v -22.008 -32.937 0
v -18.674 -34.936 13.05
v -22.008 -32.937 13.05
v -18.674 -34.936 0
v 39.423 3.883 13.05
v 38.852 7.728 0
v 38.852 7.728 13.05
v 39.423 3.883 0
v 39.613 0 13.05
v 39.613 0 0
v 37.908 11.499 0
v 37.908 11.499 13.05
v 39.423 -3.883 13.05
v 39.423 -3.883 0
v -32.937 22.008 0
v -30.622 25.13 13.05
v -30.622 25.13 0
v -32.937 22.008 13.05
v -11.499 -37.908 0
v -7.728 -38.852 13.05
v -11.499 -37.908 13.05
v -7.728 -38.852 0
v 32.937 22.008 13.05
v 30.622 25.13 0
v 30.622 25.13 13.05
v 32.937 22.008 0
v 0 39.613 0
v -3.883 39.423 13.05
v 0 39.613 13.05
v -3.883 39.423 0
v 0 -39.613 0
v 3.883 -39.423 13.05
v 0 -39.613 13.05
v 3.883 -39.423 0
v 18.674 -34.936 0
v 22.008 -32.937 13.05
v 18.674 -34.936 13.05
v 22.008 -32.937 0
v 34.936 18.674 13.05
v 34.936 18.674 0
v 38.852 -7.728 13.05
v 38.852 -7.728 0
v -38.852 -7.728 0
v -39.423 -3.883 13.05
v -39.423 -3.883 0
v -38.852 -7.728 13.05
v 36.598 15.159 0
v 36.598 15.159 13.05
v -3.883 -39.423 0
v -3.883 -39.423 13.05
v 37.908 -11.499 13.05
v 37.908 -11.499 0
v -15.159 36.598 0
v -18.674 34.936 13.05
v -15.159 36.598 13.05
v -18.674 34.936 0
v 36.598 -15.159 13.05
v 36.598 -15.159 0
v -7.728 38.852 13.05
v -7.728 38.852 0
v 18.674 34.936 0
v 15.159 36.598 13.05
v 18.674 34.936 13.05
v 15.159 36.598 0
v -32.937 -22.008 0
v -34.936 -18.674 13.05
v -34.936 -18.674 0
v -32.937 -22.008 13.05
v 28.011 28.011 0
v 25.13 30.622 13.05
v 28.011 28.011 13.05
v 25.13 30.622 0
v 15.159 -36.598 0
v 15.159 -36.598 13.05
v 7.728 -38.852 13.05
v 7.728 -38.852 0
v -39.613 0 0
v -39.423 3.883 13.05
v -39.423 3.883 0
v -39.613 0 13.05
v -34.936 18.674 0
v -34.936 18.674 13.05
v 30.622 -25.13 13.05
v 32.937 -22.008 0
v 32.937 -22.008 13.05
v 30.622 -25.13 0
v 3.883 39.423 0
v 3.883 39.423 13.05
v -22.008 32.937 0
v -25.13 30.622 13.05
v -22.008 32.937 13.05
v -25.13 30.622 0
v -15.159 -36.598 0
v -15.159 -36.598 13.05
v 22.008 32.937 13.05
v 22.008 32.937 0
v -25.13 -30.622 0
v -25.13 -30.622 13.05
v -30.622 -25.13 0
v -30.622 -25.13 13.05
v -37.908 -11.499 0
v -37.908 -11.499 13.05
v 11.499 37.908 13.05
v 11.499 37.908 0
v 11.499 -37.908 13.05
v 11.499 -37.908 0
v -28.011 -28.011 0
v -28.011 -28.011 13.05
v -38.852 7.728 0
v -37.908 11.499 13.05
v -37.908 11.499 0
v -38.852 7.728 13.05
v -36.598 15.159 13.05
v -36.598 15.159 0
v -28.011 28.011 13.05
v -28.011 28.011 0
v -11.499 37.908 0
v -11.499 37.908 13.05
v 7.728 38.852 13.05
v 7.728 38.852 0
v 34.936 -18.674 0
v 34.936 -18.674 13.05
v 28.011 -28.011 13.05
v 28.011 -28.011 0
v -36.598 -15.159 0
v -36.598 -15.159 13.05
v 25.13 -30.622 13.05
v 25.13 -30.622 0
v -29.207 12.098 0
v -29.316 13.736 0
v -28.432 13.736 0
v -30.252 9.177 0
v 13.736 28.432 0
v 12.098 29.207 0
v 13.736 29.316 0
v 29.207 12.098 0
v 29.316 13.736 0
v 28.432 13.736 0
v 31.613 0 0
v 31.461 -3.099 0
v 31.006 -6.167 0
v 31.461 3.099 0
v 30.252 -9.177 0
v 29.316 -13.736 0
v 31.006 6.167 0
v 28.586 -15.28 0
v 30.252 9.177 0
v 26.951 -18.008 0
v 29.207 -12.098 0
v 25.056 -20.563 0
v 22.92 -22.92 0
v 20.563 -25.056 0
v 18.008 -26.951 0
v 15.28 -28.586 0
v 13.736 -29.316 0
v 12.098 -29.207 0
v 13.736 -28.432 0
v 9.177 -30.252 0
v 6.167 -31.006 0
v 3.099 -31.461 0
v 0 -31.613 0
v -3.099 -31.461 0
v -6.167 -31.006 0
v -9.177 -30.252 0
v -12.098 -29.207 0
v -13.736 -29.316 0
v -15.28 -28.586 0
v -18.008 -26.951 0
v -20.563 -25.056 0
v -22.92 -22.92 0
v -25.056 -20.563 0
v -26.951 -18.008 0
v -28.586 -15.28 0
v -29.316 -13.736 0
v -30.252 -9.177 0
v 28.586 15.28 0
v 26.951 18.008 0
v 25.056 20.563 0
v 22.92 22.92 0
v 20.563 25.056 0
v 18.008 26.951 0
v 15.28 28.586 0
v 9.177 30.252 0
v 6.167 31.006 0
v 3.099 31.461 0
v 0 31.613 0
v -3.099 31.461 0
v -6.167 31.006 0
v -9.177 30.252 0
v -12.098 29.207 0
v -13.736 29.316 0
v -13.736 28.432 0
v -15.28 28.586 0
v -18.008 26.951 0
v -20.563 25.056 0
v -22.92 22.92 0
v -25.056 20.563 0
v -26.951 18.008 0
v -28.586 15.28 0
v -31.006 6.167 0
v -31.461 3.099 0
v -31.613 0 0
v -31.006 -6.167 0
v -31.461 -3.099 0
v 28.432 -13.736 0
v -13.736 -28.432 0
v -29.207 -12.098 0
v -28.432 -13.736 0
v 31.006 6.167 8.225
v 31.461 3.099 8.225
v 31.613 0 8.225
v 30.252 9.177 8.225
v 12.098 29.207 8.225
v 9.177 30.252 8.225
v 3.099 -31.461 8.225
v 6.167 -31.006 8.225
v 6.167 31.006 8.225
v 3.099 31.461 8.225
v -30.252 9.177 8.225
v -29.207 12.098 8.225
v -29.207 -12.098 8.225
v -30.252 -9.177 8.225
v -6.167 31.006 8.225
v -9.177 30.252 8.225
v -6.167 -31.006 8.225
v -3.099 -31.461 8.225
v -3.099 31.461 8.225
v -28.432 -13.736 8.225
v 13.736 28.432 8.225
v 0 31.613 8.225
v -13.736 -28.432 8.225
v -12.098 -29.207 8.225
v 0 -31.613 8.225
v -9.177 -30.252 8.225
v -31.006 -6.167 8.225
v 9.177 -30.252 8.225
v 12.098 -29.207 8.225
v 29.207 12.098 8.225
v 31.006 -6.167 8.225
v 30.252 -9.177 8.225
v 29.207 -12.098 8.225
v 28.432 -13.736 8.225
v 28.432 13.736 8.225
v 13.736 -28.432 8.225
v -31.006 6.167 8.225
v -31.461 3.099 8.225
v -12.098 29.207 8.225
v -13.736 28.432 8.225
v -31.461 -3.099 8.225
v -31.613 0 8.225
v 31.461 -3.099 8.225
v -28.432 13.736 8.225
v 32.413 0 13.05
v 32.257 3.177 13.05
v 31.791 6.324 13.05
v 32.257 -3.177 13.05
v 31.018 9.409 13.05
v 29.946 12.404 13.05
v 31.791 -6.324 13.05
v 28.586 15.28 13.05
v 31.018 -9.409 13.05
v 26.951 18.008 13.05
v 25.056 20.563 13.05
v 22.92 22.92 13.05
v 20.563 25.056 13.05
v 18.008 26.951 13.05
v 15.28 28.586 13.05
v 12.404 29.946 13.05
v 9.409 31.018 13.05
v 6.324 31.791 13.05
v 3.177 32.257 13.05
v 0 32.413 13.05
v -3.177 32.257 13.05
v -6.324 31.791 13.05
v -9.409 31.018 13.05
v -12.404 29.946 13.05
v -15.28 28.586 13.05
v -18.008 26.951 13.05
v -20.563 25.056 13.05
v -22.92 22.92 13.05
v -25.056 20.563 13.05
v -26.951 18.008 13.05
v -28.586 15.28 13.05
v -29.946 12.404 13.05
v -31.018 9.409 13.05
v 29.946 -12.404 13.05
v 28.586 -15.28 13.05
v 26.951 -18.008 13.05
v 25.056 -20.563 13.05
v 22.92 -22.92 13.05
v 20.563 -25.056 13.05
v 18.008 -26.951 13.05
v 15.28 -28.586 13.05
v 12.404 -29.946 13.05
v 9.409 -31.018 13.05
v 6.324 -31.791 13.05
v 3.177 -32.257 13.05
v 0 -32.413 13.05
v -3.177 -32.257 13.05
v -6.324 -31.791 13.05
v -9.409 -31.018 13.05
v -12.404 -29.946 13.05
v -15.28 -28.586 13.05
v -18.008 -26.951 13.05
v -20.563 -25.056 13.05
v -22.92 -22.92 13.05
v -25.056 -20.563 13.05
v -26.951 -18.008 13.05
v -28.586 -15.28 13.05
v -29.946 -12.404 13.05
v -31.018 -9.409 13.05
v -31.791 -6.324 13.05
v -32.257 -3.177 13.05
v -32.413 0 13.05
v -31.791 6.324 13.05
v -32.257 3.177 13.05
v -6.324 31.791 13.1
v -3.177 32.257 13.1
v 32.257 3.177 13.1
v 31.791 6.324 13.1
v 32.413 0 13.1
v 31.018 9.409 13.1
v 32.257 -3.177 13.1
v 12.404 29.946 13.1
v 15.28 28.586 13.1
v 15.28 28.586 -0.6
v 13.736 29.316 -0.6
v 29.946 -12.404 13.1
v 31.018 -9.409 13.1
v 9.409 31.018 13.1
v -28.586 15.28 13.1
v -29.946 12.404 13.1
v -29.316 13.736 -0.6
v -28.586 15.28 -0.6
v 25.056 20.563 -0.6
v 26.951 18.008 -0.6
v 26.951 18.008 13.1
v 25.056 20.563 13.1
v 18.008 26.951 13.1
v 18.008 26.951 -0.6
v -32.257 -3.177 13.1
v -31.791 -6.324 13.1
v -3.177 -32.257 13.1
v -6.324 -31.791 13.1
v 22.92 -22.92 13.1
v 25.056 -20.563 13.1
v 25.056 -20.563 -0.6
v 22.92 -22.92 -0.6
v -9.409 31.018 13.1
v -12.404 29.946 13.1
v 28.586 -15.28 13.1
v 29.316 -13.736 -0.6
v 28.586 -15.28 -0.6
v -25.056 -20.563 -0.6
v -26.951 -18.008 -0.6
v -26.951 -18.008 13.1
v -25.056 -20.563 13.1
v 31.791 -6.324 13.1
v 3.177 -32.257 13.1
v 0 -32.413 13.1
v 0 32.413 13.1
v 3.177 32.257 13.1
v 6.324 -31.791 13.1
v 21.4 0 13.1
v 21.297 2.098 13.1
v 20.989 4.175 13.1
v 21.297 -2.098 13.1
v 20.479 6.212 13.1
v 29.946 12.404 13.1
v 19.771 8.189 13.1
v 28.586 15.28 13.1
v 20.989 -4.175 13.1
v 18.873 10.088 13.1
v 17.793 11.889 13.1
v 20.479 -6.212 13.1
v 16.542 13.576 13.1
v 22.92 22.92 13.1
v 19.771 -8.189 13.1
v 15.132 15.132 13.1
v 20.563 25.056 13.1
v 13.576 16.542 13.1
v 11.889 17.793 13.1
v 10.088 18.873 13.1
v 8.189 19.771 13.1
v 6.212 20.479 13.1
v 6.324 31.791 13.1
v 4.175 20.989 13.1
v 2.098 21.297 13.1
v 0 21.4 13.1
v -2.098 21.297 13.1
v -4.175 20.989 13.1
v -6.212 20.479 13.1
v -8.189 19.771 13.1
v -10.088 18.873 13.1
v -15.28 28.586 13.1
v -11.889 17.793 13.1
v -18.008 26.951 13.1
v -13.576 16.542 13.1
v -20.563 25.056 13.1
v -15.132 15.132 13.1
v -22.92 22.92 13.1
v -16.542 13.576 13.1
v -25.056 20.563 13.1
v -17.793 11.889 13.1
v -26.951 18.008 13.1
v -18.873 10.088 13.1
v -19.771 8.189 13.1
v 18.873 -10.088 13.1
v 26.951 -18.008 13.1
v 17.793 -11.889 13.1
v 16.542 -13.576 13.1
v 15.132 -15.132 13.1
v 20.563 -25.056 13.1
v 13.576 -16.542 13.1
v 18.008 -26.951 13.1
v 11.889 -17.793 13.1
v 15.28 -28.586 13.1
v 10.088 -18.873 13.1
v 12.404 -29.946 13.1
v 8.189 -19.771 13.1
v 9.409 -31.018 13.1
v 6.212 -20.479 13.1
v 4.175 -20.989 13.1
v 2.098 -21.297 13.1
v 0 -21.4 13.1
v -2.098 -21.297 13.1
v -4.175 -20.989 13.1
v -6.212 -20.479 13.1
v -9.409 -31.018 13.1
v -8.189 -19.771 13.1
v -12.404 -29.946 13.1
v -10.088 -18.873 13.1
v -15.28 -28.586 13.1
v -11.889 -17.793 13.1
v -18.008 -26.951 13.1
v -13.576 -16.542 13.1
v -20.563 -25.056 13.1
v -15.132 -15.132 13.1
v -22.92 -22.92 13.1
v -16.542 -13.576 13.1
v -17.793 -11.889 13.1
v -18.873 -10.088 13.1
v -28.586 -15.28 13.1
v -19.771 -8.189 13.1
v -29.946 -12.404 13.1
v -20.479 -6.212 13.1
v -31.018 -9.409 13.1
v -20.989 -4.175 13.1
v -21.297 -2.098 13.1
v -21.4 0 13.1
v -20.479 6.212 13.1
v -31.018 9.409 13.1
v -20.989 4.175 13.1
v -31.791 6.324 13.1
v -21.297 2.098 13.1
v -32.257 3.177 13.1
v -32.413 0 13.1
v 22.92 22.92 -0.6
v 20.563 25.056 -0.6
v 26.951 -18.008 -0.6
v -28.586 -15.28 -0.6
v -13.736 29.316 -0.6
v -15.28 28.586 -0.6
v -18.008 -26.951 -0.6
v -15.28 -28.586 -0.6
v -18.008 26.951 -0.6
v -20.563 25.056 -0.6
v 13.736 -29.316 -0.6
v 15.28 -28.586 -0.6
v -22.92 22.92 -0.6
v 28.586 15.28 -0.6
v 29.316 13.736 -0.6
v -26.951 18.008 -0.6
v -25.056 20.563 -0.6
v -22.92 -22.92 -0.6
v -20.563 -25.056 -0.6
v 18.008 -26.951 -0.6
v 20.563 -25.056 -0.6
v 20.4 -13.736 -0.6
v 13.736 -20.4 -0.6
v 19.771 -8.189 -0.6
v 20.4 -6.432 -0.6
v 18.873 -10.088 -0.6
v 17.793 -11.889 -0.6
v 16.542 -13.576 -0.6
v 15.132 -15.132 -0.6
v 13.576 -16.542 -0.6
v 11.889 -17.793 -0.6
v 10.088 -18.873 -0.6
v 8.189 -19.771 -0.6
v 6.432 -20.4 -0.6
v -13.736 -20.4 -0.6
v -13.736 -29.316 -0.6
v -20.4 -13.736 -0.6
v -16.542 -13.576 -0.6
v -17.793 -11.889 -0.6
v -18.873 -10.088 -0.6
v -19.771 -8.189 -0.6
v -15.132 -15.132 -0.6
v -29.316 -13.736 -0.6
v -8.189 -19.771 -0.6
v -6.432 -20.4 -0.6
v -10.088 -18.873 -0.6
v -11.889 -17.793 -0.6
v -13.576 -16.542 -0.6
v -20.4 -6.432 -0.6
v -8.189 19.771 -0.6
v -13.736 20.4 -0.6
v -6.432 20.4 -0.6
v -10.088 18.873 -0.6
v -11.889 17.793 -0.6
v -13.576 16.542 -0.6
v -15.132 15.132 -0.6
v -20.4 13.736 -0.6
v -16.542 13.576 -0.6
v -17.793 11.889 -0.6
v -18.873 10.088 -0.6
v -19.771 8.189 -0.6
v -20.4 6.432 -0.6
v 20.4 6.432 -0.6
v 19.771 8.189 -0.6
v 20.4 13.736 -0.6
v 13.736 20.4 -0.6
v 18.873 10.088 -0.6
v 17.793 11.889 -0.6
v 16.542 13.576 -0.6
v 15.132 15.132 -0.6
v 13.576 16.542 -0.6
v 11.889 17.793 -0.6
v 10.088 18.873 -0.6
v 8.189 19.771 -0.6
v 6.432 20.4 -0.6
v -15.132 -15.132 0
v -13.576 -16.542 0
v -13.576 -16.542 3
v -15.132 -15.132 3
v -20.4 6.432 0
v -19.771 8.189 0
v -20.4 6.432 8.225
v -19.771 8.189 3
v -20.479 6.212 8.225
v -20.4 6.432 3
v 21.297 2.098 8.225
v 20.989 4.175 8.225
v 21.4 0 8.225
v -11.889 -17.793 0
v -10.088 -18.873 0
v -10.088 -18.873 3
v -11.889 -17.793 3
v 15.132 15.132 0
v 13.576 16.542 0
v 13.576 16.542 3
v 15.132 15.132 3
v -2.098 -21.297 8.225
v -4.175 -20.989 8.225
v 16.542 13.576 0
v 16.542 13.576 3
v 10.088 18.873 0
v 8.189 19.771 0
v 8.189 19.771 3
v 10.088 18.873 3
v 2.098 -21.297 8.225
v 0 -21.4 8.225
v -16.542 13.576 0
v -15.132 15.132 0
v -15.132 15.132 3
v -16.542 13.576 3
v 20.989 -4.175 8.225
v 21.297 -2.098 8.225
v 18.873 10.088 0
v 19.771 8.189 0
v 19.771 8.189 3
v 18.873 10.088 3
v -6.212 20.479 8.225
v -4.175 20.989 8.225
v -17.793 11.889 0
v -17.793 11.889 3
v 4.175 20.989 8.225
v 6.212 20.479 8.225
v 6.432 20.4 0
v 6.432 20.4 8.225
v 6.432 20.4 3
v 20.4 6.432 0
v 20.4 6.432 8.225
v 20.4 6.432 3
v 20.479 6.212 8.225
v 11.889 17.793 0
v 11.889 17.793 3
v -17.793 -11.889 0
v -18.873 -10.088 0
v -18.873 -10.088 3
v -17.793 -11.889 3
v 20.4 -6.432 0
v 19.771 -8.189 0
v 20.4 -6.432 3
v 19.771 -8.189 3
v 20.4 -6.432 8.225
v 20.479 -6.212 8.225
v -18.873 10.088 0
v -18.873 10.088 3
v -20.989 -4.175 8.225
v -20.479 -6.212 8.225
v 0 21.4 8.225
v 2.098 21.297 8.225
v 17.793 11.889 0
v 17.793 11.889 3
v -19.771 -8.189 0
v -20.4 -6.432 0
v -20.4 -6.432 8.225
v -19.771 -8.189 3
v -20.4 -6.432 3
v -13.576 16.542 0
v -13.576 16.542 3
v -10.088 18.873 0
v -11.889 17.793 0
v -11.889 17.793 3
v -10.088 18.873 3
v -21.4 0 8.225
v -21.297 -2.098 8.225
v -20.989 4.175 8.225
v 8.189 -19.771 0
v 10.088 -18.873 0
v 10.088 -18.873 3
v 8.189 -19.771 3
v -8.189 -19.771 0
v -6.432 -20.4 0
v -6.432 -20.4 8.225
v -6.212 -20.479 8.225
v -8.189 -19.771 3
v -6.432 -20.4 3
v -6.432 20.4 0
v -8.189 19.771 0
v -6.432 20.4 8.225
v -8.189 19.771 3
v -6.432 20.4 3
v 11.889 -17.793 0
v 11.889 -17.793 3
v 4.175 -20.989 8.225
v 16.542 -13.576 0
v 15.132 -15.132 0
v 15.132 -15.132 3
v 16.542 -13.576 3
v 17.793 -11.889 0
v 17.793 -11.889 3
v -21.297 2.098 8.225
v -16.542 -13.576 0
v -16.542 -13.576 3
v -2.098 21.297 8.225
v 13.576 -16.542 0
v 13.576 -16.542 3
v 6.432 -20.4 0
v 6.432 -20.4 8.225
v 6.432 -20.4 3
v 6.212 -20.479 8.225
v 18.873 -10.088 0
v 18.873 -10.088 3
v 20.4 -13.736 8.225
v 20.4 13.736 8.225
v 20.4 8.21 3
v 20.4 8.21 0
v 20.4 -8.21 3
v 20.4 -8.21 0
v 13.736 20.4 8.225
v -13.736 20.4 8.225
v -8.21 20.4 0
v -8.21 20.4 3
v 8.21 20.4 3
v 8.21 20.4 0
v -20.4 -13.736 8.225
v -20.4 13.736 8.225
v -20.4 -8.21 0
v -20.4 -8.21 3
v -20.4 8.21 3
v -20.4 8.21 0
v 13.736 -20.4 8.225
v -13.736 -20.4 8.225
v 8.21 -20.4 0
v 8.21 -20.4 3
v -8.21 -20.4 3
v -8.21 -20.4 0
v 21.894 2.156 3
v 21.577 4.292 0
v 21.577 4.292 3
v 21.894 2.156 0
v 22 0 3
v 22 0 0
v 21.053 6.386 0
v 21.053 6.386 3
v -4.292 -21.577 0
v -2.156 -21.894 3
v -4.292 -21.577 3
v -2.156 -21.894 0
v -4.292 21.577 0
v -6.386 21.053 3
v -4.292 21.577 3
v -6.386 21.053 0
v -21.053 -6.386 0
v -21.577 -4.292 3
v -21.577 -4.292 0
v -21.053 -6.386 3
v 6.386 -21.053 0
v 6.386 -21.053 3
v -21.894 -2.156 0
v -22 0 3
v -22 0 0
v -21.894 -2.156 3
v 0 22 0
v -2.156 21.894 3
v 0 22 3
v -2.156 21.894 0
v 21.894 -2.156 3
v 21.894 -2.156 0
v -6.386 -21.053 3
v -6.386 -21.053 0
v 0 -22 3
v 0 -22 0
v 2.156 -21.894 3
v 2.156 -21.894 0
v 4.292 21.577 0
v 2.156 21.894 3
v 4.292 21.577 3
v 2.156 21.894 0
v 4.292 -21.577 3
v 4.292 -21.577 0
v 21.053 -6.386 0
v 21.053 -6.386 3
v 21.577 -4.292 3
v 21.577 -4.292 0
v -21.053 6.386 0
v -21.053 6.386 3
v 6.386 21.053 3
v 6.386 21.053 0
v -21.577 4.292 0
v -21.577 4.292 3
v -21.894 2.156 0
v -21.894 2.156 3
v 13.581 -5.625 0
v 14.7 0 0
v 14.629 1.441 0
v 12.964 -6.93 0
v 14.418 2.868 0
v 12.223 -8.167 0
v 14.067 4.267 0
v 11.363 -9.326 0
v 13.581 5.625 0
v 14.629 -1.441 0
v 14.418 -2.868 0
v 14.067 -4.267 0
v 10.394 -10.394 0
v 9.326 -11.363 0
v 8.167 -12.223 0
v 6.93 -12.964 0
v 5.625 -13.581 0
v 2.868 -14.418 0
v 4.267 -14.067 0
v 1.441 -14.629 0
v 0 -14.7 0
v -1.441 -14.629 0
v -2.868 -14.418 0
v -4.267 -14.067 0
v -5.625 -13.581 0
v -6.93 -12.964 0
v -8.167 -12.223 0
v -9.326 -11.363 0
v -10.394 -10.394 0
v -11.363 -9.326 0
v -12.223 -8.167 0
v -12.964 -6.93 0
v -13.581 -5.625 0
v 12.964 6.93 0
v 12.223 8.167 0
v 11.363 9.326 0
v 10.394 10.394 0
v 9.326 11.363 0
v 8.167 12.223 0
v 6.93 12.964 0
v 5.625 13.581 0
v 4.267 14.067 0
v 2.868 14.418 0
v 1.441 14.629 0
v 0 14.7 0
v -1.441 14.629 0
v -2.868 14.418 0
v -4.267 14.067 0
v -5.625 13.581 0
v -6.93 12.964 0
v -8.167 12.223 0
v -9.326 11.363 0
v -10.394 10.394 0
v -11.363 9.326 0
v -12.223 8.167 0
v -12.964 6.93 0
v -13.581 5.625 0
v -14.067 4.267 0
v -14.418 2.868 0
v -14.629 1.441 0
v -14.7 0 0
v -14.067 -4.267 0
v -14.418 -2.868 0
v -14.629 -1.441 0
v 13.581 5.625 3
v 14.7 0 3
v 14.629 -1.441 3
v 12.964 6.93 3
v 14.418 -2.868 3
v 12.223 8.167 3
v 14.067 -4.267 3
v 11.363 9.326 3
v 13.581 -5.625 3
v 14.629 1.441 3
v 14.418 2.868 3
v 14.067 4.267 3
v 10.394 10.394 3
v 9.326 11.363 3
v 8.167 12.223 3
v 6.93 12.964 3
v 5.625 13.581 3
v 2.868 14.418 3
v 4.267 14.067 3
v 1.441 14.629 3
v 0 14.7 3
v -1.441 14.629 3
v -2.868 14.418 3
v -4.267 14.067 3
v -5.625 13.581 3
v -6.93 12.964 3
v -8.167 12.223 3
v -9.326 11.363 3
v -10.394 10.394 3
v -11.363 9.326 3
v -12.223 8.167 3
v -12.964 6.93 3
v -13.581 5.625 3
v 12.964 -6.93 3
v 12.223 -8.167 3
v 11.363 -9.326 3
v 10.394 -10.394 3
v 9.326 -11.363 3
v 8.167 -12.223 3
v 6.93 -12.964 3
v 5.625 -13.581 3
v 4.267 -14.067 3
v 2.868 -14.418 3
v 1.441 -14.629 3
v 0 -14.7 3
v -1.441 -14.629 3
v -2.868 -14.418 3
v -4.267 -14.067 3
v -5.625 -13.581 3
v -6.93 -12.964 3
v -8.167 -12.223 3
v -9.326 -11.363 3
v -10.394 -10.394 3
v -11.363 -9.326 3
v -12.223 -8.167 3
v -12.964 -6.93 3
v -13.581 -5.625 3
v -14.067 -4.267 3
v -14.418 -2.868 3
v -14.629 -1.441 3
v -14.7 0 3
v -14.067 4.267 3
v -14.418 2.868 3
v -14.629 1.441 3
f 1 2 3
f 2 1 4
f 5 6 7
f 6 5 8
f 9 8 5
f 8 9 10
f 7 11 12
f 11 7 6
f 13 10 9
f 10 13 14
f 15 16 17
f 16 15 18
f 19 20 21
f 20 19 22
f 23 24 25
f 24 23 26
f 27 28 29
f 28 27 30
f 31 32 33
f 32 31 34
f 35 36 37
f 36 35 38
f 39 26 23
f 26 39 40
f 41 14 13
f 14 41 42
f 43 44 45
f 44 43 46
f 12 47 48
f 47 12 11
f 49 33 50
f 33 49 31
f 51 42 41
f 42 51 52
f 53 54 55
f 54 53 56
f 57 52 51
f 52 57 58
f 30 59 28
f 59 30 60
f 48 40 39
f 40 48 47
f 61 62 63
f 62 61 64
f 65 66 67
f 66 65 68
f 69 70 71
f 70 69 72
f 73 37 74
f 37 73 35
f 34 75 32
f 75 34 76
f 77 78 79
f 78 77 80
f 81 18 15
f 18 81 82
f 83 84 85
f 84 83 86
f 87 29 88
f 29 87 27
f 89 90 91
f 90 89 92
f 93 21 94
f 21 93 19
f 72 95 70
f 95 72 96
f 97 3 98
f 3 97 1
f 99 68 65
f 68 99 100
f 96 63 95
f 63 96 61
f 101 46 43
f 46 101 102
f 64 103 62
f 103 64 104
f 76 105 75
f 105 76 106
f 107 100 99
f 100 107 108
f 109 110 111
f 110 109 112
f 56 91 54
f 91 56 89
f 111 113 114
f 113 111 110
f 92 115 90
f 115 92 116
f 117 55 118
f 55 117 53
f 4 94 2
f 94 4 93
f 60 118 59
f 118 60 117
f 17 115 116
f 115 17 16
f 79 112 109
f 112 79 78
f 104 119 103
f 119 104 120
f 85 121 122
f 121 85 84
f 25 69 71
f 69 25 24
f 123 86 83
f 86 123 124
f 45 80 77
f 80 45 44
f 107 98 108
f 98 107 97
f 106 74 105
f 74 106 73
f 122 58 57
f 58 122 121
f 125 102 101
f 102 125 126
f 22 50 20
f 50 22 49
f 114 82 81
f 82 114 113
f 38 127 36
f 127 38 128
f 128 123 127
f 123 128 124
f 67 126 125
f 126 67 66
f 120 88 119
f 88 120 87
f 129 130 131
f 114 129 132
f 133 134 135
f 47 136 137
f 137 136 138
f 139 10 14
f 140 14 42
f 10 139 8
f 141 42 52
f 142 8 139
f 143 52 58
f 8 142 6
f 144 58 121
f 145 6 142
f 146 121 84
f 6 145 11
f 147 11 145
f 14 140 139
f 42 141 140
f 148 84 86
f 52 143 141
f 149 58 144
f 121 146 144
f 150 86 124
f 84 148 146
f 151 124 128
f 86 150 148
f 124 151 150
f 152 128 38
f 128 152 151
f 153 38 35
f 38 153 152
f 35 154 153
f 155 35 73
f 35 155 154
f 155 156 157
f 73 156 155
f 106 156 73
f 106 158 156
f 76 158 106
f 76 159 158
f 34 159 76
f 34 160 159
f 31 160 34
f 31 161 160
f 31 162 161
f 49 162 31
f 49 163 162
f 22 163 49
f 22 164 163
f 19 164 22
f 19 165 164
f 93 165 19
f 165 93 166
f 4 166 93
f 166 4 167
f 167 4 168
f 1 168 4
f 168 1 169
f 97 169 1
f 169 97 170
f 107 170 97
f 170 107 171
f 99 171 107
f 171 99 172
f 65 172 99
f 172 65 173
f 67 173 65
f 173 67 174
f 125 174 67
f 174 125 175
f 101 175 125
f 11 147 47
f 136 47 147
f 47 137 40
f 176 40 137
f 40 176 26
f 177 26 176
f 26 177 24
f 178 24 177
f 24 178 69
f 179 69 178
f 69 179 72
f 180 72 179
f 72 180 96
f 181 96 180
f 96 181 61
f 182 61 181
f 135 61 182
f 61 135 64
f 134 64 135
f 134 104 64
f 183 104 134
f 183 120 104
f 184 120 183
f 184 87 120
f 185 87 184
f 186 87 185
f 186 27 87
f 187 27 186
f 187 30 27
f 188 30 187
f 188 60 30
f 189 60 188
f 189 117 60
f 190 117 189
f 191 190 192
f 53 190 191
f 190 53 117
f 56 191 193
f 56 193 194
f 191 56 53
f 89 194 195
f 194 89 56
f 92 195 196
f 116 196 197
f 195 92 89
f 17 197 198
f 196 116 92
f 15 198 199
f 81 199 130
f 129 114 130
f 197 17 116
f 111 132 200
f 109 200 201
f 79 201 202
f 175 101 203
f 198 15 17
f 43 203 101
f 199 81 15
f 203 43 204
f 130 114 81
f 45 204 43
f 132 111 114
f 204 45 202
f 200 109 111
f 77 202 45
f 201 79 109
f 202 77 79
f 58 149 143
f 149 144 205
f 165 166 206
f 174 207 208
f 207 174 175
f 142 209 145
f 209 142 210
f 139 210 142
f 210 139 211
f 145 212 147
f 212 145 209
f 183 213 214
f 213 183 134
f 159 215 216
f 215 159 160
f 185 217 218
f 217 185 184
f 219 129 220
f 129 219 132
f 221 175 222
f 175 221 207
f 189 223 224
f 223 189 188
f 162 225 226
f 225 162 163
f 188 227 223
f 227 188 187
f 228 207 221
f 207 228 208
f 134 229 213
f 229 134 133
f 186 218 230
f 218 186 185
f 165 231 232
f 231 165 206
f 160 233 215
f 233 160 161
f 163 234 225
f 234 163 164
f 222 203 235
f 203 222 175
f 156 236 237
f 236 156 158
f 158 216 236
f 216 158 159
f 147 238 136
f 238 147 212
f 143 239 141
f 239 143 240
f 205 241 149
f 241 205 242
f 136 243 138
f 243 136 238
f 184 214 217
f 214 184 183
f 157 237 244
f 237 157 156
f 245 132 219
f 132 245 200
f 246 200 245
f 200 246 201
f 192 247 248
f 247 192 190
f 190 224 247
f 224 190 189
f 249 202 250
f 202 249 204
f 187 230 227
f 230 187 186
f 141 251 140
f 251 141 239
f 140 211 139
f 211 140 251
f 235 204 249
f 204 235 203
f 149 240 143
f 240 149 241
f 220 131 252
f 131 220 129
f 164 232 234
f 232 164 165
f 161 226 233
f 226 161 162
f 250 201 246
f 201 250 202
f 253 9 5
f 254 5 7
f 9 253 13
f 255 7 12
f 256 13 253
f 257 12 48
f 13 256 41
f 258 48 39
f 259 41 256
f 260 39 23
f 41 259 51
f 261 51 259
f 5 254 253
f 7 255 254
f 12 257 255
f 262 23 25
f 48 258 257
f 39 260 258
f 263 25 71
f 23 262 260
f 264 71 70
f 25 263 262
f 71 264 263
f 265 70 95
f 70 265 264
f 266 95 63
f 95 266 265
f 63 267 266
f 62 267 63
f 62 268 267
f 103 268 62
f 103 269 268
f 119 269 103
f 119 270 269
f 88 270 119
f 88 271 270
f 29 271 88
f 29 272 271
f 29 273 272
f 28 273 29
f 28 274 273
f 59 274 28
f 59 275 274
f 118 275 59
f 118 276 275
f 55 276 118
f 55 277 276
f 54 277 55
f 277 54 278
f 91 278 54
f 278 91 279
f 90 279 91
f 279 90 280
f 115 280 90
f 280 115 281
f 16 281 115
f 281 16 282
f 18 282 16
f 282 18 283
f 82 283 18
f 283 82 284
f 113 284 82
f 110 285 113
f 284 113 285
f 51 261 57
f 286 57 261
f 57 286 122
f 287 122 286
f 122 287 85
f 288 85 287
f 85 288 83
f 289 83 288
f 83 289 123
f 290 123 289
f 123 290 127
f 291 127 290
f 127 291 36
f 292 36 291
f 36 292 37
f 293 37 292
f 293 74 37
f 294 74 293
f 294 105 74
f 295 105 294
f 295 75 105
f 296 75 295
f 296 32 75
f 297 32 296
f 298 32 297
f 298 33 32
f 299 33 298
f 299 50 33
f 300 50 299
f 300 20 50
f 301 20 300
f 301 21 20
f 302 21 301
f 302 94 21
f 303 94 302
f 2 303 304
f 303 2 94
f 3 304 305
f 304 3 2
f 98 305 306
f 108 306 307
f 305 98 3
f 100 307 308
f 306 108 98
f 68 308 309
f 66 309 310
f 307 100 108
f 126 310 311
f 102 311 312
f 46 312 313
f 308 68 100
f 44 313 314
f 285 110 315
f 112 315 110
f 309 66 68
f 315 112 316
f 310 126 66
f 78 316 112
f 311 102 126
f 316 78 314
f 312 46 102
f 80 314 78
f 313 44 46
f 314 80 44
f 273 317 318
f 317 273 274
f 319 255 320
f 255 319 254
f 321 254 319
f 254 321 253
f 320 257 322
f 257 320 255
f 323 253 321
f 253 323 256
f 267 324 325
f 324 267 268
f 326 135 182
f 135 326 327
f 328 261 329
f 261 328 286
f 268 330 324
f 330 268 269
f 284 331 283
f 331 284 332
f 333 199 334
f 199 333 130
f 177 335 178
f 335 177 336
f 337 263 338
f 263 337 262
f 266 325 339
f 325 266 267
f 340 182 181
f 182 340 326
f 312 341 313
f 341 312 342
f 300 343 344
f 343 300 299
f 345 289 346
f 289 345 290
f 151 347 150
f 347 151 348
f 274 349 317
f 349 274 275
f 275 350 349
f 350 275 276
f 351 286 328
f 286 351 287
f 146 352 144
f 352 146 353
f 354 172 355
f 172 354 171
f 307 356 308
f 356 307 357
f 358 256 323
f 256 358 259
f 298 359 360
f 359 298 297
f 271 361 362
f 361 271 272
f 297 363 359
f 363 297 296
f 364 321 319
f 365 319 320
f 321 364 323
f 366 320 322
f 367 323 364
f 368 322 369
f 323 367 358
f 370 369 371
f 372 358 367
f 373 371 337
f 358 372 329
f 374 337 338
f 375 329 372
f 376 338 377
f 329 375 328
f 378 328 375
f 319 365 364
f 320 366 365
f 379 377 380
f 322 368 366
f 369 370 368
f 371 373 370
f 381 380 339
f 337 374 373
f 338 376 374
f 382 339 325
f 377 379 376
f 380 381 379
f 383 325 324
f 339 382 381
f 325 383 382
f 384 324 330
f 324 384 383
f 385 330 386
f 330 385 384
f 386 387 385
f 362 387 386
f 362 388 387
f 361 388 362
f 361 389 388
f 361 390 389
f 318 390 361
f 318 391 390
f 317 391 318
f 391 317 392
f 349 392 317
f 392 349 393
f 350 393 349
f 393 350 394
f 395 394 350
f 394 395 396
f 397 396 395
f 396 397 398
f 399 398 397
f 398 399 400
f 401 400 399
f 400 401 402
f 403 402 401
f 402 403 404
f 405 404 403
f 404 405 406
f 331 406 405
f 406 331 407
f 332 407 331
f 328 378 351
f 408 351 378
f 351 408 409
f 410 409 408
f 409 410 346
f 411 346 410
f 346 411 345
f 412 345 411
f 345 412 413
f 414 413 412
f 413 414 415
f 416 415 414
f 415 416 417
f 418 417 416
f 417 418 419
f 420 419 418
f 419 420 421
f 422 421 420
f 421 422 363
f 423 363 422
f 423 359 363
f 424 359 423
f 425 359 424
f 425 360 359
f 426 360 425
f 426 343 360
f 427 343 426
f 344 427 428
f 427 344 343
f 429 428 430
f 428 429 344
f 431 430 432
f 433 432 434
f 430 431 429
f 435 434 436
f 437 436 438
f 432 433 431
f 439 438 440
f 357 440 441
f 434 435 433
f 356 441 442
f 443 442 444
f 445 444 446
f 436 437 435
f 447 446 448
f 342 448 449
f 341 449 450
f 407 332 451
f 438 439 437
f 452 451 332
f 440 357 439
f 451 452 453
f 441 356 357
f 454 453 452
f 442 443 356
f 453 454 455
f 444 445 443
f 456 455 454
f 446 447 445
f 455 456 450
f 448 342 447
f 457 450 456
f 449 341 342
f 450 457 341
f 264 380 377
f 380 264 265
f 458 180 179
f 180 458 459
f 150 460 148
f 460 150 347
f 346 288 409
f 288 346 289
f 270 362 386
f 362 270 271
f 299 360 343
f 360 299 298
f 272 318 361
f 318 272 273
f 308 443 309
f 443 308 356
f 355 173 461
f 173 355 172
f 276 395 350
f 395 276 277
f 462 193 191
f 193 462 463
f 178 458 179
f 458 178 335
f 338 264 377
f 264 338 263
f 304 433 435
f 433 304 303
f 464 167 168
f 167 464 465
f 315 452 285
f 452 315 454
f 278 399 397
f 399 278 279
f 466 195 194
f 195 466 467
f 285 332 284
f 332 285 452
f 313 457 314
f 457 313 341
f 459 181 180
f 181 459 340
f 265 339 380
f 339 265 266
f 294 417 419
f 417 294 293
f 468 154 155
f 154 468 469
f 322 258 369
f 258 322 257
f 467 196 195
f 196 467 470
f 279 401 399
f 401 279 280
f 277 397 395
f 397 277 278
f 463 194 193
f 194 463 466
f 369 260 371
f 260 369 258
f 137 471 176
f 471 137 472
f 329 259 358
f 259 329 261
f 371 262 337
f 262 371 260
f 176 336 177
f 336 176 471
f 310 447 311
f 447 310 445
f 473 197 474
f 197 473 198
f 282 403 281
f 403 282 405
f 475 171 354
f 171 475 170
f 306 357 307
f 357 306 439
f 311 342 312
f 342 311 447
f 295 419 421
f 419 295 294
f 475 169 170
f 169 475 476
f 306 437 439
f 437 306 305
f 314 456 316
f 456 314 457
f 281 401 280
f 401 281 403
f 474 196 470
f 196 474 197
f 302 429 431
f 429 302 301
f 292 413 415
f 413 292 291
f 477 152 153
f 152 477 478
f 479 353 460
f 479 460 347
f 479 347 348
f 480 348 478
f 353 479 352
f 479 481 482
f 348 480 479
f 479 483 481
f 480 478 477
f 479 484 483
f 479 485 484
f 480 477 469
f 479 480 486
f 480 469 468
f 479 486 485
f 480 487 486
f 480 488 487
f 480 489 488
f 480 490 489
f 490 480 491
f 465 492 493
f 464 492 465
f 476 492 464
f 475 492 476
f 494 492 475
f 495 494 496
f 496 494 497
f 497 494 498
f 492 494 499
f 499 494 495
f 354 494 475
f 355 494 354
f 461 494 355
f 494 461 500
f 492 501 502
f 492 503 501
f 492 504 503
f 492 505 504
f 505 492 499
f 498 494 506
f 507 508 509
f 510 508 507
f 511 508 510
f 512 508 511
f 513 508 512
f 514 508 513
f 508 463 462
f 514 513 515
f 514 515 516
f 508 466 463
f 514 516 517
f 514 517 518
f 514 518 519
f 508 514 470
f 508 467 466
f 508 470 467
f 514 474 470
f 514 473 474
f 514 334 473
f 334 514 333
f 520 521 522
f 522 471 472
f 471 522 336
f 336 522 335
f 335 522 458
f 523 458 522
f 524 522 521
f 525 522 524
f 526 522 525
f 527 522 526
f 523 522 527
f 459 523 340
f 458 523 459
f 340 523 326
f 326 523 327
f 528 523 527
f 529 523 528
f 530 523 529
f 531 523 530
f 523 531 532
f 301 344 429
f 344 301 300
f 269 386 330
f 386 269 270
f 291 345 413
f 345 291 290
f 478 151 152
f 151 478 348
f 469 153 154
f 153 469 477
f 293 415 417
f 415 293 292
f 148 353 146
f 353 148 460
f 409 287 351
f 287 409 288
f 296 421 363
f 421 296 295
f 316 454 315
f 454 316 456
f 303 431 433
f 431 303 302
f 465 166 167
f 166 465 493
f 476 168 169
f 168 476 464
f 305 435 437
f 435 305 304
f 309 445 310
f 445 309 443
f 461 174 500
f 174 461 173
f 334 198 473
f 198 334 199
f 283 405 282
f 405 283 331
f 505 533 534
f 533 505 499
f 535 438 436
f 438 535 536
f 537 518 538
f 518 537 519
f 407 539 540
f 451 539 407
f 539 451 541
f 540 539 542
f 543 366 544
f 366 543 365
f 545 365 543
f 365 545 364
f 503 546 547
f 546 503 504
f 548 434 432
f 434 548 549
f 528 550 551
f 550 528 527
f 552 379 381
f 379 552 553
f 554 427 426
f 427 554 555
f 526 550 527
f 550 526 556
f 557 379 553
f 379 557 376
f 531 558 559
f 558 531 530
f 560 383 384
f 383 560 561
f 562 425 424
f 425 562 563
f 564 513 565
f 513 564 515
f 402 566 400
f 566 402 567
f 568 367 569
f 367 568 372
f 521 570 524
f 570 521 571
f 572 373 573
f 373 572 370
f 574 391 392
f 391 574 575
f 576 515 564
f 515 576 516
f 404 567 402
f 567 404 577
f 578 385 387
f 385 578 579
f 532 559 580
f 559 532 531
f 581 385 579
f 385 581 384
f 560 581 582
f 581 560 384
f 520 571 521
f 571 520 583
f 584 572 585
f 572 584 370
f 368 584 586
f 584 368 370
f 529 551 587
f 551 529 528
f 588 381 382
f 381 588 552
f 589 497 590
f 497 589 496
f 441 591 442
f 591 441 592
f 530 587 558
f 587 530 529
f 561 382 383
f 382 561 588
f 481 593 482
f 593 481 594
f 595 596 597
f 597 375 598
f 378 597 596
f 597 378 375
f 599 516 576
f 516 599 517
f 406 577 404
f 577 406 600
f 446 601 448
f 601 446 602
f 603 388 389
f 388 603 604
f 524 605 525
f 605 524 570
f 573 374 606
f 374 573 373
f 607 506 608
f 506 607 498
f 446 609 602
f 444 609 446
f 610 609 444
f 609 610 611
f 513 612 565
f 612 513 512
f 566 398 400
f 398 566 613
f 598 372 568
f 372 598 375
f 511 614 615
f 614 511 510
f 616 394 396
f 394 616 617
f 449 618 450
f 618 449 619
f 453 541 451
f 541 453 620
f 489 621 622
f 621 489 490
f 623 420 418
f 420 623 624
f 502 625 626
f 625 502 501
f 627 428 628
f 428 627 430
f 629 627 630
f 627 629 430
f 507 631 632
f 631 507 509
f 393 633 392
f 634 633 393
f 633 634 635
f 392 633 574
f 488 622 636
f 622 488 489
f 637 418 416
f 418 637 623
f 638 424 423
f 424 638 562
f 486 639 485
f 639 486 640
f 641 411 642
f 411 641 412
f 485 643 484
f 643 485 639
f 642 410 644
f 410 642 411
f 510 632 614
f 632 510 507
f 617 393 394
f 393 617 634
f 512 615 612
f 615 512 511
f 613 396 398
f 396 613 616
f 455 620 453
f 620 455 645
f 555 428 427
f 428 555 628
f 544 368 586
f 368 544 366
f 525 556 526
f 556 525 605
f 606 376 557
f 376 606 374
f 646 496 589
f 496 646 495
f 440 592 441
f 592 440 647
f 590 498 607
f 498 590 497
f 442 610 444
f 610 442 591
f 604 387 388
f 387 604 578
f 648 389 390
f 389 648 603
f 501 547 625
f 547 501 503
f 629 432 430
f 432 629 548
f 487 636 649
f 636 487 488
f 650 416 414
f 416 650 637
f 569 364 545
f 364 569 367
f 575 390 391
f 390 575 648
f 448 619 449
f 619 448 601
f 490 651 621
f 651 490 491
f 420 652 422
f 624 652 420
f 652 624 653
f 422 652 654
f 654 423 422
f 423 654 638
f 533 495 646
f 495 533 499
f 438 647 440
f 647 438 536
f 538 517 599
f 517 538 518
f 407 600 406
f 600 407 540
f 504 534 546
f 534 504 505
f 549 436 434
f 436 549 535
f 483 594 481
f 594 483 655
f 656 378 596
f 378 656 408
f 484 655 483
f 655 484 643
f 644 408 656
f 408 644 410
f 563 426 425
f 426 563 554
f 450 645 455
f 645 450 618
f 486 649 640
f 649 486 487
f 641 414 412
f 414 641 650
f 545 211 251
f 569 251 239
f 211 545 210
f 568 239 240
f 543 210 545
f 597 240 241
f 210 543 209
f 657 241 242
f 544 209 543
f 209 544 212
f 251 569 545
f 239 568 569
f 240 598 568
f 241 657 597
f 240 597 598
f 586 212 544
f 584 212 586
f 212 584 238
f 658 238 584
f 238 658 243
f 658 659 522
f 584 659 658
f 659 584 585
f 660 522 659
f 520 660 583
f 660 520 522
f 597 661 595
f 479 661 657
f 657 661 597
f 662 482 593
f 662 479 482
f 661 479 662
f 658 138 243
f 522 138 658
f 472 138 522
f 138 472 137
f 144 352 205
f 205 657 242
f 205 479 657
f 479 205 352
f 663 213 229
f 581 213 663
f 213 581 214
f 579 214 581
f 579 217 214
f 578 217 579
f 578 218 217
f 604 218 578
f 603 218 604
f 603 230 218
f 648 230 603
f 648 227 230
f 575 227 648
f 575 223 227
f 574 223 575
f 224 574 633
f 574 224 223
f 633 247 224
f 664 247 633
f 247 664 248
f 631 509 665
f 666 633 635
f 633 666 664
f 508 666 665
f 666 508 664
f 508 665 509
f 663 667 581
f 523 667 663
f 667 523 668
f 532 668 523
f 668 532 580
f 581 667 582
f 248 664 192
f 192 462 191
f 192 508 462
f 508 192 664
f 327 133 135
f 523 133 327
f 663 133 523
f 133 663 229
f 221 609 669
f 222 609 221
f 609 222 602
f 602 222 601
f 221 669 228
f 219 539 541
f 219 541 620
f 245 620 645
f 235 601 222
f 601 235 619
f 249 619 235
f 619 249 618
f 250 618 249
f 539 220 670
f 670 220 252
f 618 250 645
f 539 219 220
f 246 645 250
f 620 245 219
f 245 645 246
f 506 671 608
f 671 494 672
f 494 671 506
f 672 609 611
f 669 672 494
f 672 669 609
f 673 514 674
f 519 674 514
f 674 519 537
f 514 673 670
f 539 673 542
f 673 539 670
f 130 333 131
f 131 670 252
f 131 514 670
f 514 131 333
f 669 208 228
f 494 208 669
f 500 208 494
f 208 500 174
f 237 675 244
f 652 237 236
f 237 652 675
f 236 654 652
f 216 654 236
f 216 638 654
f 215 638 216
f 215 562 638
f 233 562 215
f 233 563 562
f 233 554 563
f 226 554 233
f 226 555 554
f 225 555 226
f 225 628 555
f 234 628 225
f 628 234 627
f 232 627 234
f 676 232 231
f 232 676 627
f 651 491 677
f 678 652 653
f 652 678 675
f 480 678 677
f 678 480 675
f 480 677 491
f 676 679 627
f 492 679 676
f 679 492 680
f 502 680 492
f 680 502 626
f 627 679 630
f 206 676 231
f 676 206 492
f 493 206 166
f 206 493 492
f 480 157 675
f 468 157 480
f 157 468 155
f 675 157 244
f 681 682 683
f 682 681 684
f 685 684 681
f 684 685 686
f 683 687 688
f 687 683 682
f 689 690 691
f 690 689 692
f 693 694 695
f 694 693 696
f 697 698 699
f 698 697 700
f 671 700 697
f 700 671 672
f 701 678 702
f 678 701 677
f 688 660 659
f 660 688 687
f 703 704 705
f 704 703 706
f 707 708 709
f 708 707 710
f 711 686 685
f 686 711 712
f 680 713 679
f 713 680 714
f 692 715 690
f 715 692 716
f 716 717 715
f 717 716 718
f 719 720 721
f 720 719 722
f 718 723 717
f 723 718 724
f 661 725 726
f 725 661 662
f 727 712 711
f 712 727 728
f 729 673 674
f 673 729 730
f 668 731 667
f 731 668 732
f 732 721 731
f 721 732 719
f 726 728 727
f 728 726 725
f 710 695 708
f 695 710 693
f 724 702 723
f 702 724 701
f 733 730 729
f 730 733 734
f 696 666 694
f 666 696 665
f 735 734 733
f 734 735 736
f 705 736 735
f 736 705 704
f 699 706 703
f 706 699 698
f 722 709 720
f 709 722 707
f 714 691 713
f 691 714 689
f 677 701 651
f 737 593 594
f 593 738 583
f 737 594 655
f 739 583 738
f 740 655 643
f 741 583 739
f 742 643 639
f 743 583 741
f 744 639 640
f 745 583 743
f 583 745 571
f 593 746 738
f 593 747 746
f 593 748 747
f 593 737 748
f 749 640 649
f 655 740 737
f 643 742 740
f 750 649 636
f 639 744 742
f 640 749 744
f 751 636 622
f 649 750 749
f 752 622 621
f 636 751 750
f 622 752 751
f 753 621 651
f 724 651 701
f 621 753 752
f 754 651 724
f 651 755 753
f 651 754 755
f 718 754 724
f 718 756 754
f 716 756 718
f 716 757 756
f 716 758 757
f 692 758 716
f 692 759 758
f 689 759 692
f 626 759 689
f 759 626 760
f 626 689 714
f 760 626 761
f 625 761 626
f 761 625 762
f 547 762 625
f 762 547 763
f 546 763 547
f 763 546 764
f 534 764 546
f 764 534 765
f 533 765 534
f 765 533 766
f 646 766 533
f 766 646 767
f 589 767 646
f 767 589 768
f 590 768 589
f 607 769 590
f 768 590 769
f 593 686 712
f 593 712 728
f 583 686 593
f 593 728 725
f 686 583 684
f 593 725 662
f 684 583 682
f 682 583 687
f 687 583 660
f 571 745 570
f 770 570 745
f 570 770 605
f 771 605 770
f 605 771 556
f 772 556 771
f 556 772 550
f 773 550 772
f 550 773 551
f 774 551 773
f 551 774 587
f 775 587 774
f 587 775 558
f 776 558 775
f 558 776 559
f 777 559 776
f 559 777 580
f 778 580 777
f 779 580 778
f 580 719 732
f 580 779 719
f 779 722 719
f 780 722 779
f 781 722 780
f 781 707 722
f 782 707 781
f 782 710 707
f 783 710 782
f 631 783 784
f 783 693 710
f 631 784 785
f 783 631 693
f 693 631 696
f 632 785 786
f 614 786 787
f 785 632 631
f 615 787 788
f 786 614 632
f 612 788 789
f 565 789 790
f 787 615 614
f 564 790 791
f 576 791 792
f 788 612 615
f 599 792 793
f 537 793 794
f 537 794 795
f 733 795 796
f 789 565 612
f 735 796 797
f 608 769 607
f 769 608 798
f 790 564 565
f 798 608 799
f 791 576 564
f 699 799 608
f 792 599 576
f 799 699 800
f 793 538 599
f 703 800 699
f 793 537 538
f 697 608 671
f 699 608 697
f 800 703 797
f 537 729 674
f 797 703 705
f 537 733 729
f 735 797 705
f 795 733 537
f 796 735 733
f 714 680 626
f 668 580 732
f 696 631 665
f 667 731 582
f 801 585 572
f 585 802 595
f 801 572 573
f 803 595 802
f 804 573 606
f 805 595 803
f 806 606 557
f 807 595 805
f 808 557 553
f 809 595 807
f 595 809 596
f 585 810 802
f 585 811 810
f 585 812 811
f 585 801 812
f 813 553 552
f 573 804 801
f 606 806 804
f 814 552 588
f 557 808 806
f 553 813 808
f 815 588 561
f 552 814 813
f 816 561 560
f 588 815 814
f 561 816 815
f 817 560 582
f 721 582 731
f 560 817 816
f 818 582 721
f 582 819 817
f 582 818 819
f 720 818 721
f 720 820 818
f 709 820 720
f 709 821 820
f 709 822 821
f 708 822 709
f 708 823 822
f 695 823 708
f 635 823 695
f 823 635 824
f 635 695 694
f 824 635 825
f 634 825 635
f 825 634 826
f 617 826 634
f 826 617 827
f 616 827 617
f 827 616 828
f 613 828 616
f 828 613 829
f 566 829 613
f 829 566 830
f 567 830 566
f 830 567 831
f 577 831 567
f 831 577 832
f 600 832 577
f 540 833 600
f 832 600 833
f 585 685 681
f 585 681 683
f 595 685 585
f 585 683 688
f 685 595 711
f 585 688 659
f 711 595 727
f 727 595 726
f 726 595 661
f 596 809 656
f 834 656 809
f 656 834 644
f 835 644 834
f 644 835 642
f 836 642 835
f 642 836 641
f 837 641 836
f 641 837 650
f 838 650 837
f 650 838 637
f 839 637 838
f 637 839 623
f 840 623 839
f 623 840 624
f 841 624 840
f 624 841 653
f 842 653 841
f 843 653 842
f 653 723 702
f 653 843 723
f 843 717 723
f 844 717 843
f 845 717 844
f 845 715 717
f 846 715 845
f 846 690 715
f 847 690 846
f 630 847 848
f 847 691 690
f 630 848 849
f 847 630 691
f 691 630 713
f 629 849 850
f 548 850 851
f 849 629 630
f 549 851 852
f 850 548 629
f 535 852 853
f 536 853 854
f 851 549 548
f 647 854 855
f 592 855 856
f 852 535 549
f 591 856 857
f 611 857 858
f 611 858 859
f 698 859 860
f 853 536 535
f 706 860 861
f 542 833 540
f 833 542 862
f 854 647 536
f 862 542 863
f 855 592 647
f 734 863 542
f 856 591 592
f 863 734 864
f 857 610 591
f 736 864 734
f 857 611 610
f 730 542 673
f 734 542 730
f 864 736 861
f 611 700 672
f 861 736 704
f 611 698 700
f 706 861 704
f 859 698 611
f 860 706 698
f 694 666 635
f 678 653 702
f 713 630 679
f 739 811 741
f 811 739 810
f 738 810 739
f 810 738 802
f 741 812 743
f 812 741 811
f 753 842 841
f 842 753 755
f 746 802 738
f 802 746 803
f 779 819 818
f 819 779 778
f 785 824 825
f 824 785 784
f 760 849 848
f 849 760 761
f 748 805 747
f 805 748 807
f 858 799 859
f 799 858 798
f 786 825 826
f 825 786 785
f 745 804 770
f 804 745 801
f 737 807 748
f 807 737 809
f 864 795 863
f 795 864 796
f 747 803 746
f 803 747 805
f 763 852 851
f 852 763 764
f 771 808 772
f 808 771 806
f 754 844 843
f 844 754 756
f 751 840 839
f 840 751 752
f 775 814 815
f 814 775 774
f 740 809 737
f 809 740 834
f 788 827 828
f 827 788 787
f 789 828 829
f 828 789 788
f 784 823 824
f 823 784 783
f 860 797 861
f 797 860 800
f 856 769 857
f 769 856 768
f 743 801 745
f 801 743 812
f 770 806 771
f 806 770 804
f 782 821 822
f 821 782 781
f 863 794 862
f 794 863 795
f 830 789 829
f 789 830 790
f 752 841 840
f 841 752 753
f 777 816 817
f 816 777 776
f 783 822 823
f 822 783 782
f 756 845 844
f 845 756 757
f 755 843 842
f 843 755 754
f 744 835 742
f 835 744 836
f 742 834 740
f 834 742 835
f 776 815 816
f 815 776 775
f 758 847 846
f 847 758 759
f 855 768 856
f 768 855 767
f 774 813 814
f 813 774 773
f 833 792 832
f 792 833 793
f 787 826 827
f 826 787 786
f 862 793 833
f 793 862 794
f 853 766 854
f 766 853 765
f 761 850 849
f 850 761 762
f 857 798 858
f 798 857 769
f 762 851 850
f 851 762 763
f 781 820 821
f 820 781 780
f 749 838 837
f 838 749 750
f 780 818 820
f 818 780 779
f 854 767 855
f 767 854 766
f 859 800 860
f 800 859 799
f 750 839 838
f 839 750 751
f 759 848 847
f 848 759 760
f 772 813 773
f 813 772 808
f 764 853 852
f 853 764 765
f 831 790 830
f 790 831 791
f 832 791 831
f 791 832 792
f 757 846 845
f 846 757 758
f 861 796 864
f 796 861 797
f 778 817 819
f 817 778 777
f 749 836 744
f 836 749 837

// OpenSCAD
//
// Spiral Belly Lampshade (polyhedron) for E14 — hollow shell (no vase mode)
// - Axisymmetric belly for Ø80 bulb clearance
// - Single‑lobe helical bulge with tunable height envelope & end caps
// - Spider seat with annular-ring spokes (solid overlaps; no protrusion)
// - Pattern switch: "solid", "slots", or "ribbons" (open spiral bands)
//
// Author: M365 Copilot (for Roy)
// Units: millimeters
//

///////////////////////////
// Quick preview & debug
///////////////////////////
FAST_PREVIEW     = true;     // true = faster; false = smoother
SHOW_SHELL_ONLY  = false;    // render shell only (debug)
SHOW_SPIDER_ONLY = false;    // render spider only (debug)

///////////////////////////
// Pattern mode
///////////////////////////
// "solid"   = closed shell (helical bulge only)
// "slots"   = helical slots through the shell
// "ribbons" = helical ribbons (open bands)
pattern = "solid";

// Helical cut parameters (for "slots" or "ribbons")
slot_count       = 2;        // 1..3
slot_width       = 16.0;     // mm (tangential width of each helical cut)
slot_z_margin    = 12.0;     // mm kept solid at bottom/top to preserve strength

///////////////////////////
// User Parameters
///////////////////////////

// Height & wall
height_mm            = 180;   // total height
wall_thickness       = 2.4;   // shell thickness (≈ 3 perimeters @ 0.4mm nozzle)

// Ends + belly (clearance)
base_diameter        = 60;    // outer at bottom
top_diameter_user    = 100;   // requested outer at top (may be raised by top opening guard)
axis_mid_diameter    = 140;   // axisymmetric belly OUTER diameter at mid (no spiral)
axis_width           = 0.35;  // belly width along Z (0.25..0.45)

// Helical lobe (spiralling bulge)
max_mid_diameter     = 210;   // OUTER diameter at mid at the lobe crest
bulge_turns          = 2.0;   // revolutions from bottom → top
left_handed          = false; // true to reverse direction
mid_position         = 0.50;  // where belly & lobe peak (0..1)
lobe_width           = 0.45;  // broader = visible over more height
lobe_power           = 2.2;   // 1=soft; 2..3=crisper lobe (cos^power, clamped ≥0)

// Height envelope control (visibility along height)
lobe_env_mix         = 0.25;  // 0.0 = flat (visible across height), 1.0 = Gaussian (focused at mid)
end_cap              = 0.04;  // fraction of height at each end where lobe → 0 (keeps ends circular)

// E14 mount (measure your hardware)
e14_hole_diameter    = 29.0;  // through-hole for E14 spigot (28–30 mm typical)
seat_clearance       = 0.4;   // added to hole diameter
mount_seat_od        = 44.0;  // seat OD (must exceed nut OD)
mount_seat_th        = 3.0;   // seat thickness
mount_at_top         = false; // false: bottom seat; true: top seat (pendant)

// Spider geometry — annular-ring spokes
ring_width           = 8.0;   // tie-in ring width (radial thickness)
tie_overlap_r        = 1.2;   // mm: tie ring outer intrudes into shell inner wall by this
tie_skirt_h          = 10.0;  // mm: inner skirt height overlapping shell interior

spoke_count          = 4;     // number of spokes
spoke_arc_fraction   = 0.35;  // fraction of each segment kept as solid (0.2..0.5)
spoke_seat_overlap   = 0.6;   // mm: spokes extend inward past seat OD/2 by this
spoke_ring_overlap   = 0.8;   // mm: spokes extend outward past tie-ring inner radius by this
spoke_z_bite         = 0.6;   // mm: spokes start below seat to avoid coplanar
spoke_to_skirt       = true;  // run spokes tall enough to intersect the skirt

// Bulb & clearance (sphere Ø80 mm)
bulb_diameter        = 80.0;
bulb_clearance       = 3.0;   // radial clearance
auto_clearance       = true;  // auto-raise belly to ensure bulb clearance

// Top opening: fit Ø60 bulb + fingers comfortably
top_inner_min_diam   = 95.0;  // required top INNER diameter

// Quality (poly count)
na                   = FAST_PREVIEW ? 96  : 160;   // angular segments
nz                   = FAST_PREVIEW ? 140 : 240;   // vertical rings

$fn = 64; // for cylinders (seat, ring)

///////////////////////////
// Guards & constants
///////////////////////////
assert(na >= 3, "na (angular segments) must be ≥ 3");
assert(nz >= 2, "nz (vertical rings) must be ≥ 2");
EPS = 0.05;
PI  = 3.141592653589793;

///////////////////////////
// Helpers
///////////////////////////
function clamp01(x) = x < 0 ? 0 : (x > 1 ? 1 : x);
function mix(a,b,k) = a*(1-k) + b*k;
function smoothstep01(t) = let(tt=clamp01(t)) tt*tt*(3 - 2*tt);
function gaussian(t, mu, sigma) = exp(-0.5*pow((t - mu)/sigma, 2));
function sigma_from_width(w) = max(0.05, w);

// End cap taper to zero exactly at t=0 and t=1
function end_taper(t) =
    (t < end_cap) ? smoothstep01(t/end_cap) :
    (t > 1 - end_cap) ? smoothstep01((1 - t)/end_cap) : 1;

///////////////////////////
// Derived & checks
///////////////////////////
H   = height_mm;
Ro0 = base_diameter/2;

// Enforce minimum top inner diameter by raising top outer if needed
top_outer_needed = top_inner_min_diam/2 + wall_thickness;
Ro2_user         = top_diameter_user/2;
Ro2              = max(Ro2_user, top_outer_needed);

assert(Ro0 > wall_thickness + 1 && Ro2 > wall_thickness + 1,
       "Base/top diameters too small for this wall thickness.");

required_rad_inner = bulb_diameter/2 + bulb_clearance;
required_rad_outer = required_rad_inner + wall_thickness;

axis_mid_r_user    = axis_mid_diameter/2;
axis_mid_r         = auto_clearance ? max(axis_mid_r_user, required_rad_outer) : axis_mid_r_user;
max_mid_r          = max(max_mid_diameter/2, axis_mid_r + 0.01); // crest > belly

twist_sign = left_handed ? -1 : 1;

///////////////////////////
// Radius model (helical bulge on axisymmetric belly)
///////////////////////////
function base_top_radius(t) = Ro0 + (Ro2 - Ro0)*smoothstep01(t);

function R_belly(t) =
    let(rb   = base_top_radius(t),
        rb_m = base_top_radius(mid_position),
        A    = axis_mid_r - rb_m,
        sig  = sigma_from_width(axis_width))
    rb + A * gaussian(t, mid_position, sig);

function phi_deg(t) = twist_sign * (bulge_turns * 360 * t);

function lobe_envelope(t) =
    let(g = gaussian(t, mid_position, sigma_from_width(lobe_width)))
    end_taper(t) * mix(1, g, clamp01(lobe_env_mix));

function lobe_amp(t) =
    let(A_mid = max_mid_r - axis_mid_r)
    lobe_envelope(t) * A_mid;

function lobe_shape(theta_deg) = pow(max(0, cos(theta_deg)), lobe_power);

function R_outer(t, theta_deg) = R_belly(t) + lobe_amp(t) * lobe_shape(theta_deg - phi_deg(t));
function R_inner(t, theta_deg) = R_outer(t, theta_deg) - wall_thickness;

///////////////////////////
// Polyhedron mesh (shell)
///////////////////////////
function idx_out(i,j) = i*na + (j % na);
function idx_in(i,j)  = (nz+1)*na + i*na + (j % na);

function v_out(i,j) =
    let(t = i/nz, ang = j*360/na, r = R_outer(t, ang))
    [ r*cos(ang), r*sin(ang), t*H ];

function v_in(i,j) =
    let(t = i/nz, ang = j*360/na, r = max(1, R_inner(t, ang)))
    [ r*cos(ang), r*sin(ang), t*H ];

pts_out = [ for (i=[0:nz], j=[0:na-1]) v_out(i,j) ];
pts_in  = [ for (i=[0:nz], j=[0:na-1]) v_in(i,j)  ];
points  = concat(pts_out, pts_in);

faces_outer = [
  for (i=[0:nz-1], j=[0:na-1])
  let(a=idx_out(i,j), b=idx_out(i,(j+1)%na), c=idx_out(i+1,(j+1)%na), d=idx_out(i+1,j))
  for (tri = [[a,b,c], [a,c,d]]) tri
];

faces_inner = [
  for (i=[0:nz-1], j=[0:na-1])
  let(a=idx_in(i,j), b=idx_in(i+1,j), c=idx_in(i+1,(j+1)%na), d=idx_in(i,(j+1)%na))
  for (tri = [[a,b,c], [a,c,d]]) tri
];

faces_bottom = [
  for (j=[0:na-1])
  let(a=idx_out(0,j), b=idx_out(0,(j+1)%na), c=idx_in(0,(j+1)%na), d=idx_in(0,j))
  for (tri = [[a,b,c], [a,c,d]]) tri
];

faces_top = [
  for (j=[0:na-1])
  let(a=idx_out(nz,j), b=idx_in(nz,j), c=idx_in(nz,(j+1)%na), d=idx_out(nz,(j+1)%na))
  for (tri = [[a,b,c], [a,c,d]]) tri
];

faces = concat(faces_outer, faces_inner, faces_bottom, faces_top);

module shell_poly_raw() {
    polyhedron(points=points, faces=faces, convexity=12);
}

///////////////////////////
// Helical cutters (for "slots" and "ribbons")
///////////////////////////
Rcut = max(max_mid_r, Ro0, Ro2) + 6; // radial reach of cutters
twist_total = bulge_turns * 360 * (left_handed ? -1 : 1);

module helical_cutters() {
    h_cut = max(0, H - 2*slot_z_margin);
    if (h_cut > 0) {
        for (k=[0:slot_count-1]) {
            rotate([0,0, k*360/slot_count]) {
                translate([0,0, slot_z_margin])
                    linear_extrude(height=h_cut, twist=twist_total, slices=nz, convexity=10)
                        translate([0, -slot_width/2])
                            square([Rcut, slot_width], center=false);
            }
        }
    }
}

module shell_poly() {
    if (pattern == "solid") {
        shell_poly_raw();
    } else if (pattern == "slots" || pattern == "ribbons") {
        difference() { shell_poly_raw(); helical_cutters(); }
    } else {
        shell_poly_raw();
    }
}

///////////////////////////
// Spider mount (seat + tie ring + annular-ring spokes)
///////////////////////////
module spider_mount_at_z(z_mount, at_top=false) {
    end_t = at_top ? 1 : 0;

    // Everything derived once in a single let() scope (no re-assignments)
    let(
        // Shell inner radius at the end (axisymmetric; lobe is zero)
        r_in_end       = R_belly(end_t) - wall_thickness,

        // Tie ring with positive overlap into the shell (never protrudes outside)
        r_ring_o       = r_in_end + tie_overlap_r,
        r_ring_i_raw   = r_ring_o - ring_width,
        r_ring_i       = max(mount_seat_od/2 + 1.0, r_ring_i_raw),

        // Spoke ring: overlaps seat inward and tie-ring outward; bounded below tie-ring OUTER radius
        r_spoke_i      = max(0.1, mount_seat_od/2 - spoke_seat_overlap),
        r_spoke_o_raw  = r_ring_i + spoke_ring_overlap,
        r_spoke_o_min  = r_spoke_i + 1.0,            // ensure non-degenerate ring
        r_spoke_o_cap  = r_ring_o - 0.3,             // keep inside shell wall (no outward protrusion)
        r_spoke_o      = min(r_spoke_o_cap, max(r_spoke_o_min, r_spoke_o_raw)),

        // Vertical sizing
        spoke_h        = mount_seat_th + (spoke_to_skirt ? (tie_skirt_h + EPS) : 0),

        // Windows to carve spokes out of the annular ring
        rm             = (r_spoke_i + r_spoke_o)/2,
        seg_len        = 2*PI*rm / max(1,spoke_count),
        window_w       = seg_len * (1 - clamp01(spoke_arc_fraction))
    )
    translate([0,0,z_mount]) difference() {
        union() {
            // Seat
            cylinder(h=mount_seat_th, r=mount_seat_od/2, center=false);

            // Tie ring (overlaps shell interior)
            difference() {
                cylinder(h=mount_seat_th + EPS, r=r_ring_o, center=false);
                cylinder(h=mount_seat_th + 2*EPS, r=r_ring_i, center=false);
            }

            // Inner skirt above the seat
            translate([0,0,mount_seat_th - EPS])
                difference() {
                    cylinder(h=tie_skirt_h + 2*EPS, r=r_ring_o, center=false);
                    cylinder(h=tie_skirt_h + 3*EPS, r=r_ring_i, center=false);
                }

            // Annular spoke ring with windows cut out (solid overlaps both seat & ring)
            translate([0,0,-spoke_z_bite])
                difference() {
                    // Solid annular ring
                    difference() {
                        cylinder(h=spoke_h + spoke_z_bite + EPS, r=r_spoke_o, center=false);
                        cylinder(h=spoke_h + spoke_z_bite + 2*EPS, r=r_spoke_i, center=false);
                    }
                    // Cut evenly spaced windows
                    for (s=[0:spoke_count-1]) {
                        rotate([0,0, s*360/spoke_count]) {
                            translate([rm, 0, 0])  // at mid radius
                                cube([ (r_spoke_o - r_spoke_i) + 2,  // radial overshoot
                                       window_w,                      // tangential opening
                                       spoke_h + spoke_z_bite + 4 ],  // tall cut
                                     center=true);
                        }
                    }
                }
        }
        // Through-hole for E14 spigot (+ clearance)
        cylinder(h=mount_seat_th + tie_skirt_h + spoke_h + 2.0,
                 r=(e14_hole_diameter + seat_clearance)/2, center=false);
    }
}

///////////////////////////
// Assembly
///////////////////////////
module lampshade() {
    if (SHOW_SHELL_ONLY) {
        shell_poly();
    } else if (SHOW_SPIDER_ONLY) {
        if (!mount_at_top) {
            spider_mount_at_z(0, at_top=false);
        } else {
            translate([0,0,H - mount_seat_th - tie_skirt_h]) spider_mount_at_z(0, at_top=true);
        }
    } else {
        union() {
            shell_poly();
            if (!mount_at_top) {
                spider_mount_at_z(0, at_top=false);
            } else {
                translate([0,0,H - mount_seat_th - tie_skirt_h]) spider_mount_at_z(0, at_top=true);
            }
        }
    }
}

// Diagnostics
echo(str("Vertices: ", len(points), "  Faces: ", len(faces)));
echo(str("Axis mid outer radius (after auto_clearance) = ", axis_mid_r));
echo(str("Required outer mid radius for bulb+clearance = ", required_rad_outer));
echo(str("Top outer radius used = ", Ro2));
echo(str("Top inner min required = ", top_inner_min_diam/2));

end_t_diag        = mount_at_top ? 1 : 0;
r_in_end_diag     = R_belly(end_t_diag) - wall_thickness;
r_ring_o_diag     = r_in_end_diag + tie_overlap_r;
r_ring_i_diag     = max(mount_seat_od/2 + 1.0, r_ring_o_diag - ring_width);
r_spoke_i_diag    = max(0.1, mount_seat_od/2 - spoke_seat_overlap);
r_spoke_o_raw_d   = r_ring_i_diag + spoke_ring_overlap;
r_spoke_o_min_d   = r_spoke_i_diag + 1.0;
r_spoke_o_cap_d   = r_ring_o_diag - 0.3;
r_spoke_o_diag    = min(r_spoke_o_cap_d, max(r_spoke_o_min_d, r_spoke_o_raw_d));
rm_diag           = (r_spoke_i_diag + r_spoke_o_diag)/2;
seg_len_diag      = 2*PI*rm_diag / max(1,spoke_count);
window_w_diag     = seg_len_diag * (1 - clamp01(spoke_arc_fraction));

echo(str("Spider diag: r_in_end=", r_in_end_diag,
         "  ring_i=", r_ring_i_diag,
         "  ring_o=", r_ring_o_diag,
         "  spoke_i=", r_spoke_i_diag,
         "  spoke_o=", r_spoke_o_diag,
         "  rm=", rm_diag,
         "  window_w=", window_w_diag));

///////////////////////////
// Go
///////////////////////////
lampshade();
